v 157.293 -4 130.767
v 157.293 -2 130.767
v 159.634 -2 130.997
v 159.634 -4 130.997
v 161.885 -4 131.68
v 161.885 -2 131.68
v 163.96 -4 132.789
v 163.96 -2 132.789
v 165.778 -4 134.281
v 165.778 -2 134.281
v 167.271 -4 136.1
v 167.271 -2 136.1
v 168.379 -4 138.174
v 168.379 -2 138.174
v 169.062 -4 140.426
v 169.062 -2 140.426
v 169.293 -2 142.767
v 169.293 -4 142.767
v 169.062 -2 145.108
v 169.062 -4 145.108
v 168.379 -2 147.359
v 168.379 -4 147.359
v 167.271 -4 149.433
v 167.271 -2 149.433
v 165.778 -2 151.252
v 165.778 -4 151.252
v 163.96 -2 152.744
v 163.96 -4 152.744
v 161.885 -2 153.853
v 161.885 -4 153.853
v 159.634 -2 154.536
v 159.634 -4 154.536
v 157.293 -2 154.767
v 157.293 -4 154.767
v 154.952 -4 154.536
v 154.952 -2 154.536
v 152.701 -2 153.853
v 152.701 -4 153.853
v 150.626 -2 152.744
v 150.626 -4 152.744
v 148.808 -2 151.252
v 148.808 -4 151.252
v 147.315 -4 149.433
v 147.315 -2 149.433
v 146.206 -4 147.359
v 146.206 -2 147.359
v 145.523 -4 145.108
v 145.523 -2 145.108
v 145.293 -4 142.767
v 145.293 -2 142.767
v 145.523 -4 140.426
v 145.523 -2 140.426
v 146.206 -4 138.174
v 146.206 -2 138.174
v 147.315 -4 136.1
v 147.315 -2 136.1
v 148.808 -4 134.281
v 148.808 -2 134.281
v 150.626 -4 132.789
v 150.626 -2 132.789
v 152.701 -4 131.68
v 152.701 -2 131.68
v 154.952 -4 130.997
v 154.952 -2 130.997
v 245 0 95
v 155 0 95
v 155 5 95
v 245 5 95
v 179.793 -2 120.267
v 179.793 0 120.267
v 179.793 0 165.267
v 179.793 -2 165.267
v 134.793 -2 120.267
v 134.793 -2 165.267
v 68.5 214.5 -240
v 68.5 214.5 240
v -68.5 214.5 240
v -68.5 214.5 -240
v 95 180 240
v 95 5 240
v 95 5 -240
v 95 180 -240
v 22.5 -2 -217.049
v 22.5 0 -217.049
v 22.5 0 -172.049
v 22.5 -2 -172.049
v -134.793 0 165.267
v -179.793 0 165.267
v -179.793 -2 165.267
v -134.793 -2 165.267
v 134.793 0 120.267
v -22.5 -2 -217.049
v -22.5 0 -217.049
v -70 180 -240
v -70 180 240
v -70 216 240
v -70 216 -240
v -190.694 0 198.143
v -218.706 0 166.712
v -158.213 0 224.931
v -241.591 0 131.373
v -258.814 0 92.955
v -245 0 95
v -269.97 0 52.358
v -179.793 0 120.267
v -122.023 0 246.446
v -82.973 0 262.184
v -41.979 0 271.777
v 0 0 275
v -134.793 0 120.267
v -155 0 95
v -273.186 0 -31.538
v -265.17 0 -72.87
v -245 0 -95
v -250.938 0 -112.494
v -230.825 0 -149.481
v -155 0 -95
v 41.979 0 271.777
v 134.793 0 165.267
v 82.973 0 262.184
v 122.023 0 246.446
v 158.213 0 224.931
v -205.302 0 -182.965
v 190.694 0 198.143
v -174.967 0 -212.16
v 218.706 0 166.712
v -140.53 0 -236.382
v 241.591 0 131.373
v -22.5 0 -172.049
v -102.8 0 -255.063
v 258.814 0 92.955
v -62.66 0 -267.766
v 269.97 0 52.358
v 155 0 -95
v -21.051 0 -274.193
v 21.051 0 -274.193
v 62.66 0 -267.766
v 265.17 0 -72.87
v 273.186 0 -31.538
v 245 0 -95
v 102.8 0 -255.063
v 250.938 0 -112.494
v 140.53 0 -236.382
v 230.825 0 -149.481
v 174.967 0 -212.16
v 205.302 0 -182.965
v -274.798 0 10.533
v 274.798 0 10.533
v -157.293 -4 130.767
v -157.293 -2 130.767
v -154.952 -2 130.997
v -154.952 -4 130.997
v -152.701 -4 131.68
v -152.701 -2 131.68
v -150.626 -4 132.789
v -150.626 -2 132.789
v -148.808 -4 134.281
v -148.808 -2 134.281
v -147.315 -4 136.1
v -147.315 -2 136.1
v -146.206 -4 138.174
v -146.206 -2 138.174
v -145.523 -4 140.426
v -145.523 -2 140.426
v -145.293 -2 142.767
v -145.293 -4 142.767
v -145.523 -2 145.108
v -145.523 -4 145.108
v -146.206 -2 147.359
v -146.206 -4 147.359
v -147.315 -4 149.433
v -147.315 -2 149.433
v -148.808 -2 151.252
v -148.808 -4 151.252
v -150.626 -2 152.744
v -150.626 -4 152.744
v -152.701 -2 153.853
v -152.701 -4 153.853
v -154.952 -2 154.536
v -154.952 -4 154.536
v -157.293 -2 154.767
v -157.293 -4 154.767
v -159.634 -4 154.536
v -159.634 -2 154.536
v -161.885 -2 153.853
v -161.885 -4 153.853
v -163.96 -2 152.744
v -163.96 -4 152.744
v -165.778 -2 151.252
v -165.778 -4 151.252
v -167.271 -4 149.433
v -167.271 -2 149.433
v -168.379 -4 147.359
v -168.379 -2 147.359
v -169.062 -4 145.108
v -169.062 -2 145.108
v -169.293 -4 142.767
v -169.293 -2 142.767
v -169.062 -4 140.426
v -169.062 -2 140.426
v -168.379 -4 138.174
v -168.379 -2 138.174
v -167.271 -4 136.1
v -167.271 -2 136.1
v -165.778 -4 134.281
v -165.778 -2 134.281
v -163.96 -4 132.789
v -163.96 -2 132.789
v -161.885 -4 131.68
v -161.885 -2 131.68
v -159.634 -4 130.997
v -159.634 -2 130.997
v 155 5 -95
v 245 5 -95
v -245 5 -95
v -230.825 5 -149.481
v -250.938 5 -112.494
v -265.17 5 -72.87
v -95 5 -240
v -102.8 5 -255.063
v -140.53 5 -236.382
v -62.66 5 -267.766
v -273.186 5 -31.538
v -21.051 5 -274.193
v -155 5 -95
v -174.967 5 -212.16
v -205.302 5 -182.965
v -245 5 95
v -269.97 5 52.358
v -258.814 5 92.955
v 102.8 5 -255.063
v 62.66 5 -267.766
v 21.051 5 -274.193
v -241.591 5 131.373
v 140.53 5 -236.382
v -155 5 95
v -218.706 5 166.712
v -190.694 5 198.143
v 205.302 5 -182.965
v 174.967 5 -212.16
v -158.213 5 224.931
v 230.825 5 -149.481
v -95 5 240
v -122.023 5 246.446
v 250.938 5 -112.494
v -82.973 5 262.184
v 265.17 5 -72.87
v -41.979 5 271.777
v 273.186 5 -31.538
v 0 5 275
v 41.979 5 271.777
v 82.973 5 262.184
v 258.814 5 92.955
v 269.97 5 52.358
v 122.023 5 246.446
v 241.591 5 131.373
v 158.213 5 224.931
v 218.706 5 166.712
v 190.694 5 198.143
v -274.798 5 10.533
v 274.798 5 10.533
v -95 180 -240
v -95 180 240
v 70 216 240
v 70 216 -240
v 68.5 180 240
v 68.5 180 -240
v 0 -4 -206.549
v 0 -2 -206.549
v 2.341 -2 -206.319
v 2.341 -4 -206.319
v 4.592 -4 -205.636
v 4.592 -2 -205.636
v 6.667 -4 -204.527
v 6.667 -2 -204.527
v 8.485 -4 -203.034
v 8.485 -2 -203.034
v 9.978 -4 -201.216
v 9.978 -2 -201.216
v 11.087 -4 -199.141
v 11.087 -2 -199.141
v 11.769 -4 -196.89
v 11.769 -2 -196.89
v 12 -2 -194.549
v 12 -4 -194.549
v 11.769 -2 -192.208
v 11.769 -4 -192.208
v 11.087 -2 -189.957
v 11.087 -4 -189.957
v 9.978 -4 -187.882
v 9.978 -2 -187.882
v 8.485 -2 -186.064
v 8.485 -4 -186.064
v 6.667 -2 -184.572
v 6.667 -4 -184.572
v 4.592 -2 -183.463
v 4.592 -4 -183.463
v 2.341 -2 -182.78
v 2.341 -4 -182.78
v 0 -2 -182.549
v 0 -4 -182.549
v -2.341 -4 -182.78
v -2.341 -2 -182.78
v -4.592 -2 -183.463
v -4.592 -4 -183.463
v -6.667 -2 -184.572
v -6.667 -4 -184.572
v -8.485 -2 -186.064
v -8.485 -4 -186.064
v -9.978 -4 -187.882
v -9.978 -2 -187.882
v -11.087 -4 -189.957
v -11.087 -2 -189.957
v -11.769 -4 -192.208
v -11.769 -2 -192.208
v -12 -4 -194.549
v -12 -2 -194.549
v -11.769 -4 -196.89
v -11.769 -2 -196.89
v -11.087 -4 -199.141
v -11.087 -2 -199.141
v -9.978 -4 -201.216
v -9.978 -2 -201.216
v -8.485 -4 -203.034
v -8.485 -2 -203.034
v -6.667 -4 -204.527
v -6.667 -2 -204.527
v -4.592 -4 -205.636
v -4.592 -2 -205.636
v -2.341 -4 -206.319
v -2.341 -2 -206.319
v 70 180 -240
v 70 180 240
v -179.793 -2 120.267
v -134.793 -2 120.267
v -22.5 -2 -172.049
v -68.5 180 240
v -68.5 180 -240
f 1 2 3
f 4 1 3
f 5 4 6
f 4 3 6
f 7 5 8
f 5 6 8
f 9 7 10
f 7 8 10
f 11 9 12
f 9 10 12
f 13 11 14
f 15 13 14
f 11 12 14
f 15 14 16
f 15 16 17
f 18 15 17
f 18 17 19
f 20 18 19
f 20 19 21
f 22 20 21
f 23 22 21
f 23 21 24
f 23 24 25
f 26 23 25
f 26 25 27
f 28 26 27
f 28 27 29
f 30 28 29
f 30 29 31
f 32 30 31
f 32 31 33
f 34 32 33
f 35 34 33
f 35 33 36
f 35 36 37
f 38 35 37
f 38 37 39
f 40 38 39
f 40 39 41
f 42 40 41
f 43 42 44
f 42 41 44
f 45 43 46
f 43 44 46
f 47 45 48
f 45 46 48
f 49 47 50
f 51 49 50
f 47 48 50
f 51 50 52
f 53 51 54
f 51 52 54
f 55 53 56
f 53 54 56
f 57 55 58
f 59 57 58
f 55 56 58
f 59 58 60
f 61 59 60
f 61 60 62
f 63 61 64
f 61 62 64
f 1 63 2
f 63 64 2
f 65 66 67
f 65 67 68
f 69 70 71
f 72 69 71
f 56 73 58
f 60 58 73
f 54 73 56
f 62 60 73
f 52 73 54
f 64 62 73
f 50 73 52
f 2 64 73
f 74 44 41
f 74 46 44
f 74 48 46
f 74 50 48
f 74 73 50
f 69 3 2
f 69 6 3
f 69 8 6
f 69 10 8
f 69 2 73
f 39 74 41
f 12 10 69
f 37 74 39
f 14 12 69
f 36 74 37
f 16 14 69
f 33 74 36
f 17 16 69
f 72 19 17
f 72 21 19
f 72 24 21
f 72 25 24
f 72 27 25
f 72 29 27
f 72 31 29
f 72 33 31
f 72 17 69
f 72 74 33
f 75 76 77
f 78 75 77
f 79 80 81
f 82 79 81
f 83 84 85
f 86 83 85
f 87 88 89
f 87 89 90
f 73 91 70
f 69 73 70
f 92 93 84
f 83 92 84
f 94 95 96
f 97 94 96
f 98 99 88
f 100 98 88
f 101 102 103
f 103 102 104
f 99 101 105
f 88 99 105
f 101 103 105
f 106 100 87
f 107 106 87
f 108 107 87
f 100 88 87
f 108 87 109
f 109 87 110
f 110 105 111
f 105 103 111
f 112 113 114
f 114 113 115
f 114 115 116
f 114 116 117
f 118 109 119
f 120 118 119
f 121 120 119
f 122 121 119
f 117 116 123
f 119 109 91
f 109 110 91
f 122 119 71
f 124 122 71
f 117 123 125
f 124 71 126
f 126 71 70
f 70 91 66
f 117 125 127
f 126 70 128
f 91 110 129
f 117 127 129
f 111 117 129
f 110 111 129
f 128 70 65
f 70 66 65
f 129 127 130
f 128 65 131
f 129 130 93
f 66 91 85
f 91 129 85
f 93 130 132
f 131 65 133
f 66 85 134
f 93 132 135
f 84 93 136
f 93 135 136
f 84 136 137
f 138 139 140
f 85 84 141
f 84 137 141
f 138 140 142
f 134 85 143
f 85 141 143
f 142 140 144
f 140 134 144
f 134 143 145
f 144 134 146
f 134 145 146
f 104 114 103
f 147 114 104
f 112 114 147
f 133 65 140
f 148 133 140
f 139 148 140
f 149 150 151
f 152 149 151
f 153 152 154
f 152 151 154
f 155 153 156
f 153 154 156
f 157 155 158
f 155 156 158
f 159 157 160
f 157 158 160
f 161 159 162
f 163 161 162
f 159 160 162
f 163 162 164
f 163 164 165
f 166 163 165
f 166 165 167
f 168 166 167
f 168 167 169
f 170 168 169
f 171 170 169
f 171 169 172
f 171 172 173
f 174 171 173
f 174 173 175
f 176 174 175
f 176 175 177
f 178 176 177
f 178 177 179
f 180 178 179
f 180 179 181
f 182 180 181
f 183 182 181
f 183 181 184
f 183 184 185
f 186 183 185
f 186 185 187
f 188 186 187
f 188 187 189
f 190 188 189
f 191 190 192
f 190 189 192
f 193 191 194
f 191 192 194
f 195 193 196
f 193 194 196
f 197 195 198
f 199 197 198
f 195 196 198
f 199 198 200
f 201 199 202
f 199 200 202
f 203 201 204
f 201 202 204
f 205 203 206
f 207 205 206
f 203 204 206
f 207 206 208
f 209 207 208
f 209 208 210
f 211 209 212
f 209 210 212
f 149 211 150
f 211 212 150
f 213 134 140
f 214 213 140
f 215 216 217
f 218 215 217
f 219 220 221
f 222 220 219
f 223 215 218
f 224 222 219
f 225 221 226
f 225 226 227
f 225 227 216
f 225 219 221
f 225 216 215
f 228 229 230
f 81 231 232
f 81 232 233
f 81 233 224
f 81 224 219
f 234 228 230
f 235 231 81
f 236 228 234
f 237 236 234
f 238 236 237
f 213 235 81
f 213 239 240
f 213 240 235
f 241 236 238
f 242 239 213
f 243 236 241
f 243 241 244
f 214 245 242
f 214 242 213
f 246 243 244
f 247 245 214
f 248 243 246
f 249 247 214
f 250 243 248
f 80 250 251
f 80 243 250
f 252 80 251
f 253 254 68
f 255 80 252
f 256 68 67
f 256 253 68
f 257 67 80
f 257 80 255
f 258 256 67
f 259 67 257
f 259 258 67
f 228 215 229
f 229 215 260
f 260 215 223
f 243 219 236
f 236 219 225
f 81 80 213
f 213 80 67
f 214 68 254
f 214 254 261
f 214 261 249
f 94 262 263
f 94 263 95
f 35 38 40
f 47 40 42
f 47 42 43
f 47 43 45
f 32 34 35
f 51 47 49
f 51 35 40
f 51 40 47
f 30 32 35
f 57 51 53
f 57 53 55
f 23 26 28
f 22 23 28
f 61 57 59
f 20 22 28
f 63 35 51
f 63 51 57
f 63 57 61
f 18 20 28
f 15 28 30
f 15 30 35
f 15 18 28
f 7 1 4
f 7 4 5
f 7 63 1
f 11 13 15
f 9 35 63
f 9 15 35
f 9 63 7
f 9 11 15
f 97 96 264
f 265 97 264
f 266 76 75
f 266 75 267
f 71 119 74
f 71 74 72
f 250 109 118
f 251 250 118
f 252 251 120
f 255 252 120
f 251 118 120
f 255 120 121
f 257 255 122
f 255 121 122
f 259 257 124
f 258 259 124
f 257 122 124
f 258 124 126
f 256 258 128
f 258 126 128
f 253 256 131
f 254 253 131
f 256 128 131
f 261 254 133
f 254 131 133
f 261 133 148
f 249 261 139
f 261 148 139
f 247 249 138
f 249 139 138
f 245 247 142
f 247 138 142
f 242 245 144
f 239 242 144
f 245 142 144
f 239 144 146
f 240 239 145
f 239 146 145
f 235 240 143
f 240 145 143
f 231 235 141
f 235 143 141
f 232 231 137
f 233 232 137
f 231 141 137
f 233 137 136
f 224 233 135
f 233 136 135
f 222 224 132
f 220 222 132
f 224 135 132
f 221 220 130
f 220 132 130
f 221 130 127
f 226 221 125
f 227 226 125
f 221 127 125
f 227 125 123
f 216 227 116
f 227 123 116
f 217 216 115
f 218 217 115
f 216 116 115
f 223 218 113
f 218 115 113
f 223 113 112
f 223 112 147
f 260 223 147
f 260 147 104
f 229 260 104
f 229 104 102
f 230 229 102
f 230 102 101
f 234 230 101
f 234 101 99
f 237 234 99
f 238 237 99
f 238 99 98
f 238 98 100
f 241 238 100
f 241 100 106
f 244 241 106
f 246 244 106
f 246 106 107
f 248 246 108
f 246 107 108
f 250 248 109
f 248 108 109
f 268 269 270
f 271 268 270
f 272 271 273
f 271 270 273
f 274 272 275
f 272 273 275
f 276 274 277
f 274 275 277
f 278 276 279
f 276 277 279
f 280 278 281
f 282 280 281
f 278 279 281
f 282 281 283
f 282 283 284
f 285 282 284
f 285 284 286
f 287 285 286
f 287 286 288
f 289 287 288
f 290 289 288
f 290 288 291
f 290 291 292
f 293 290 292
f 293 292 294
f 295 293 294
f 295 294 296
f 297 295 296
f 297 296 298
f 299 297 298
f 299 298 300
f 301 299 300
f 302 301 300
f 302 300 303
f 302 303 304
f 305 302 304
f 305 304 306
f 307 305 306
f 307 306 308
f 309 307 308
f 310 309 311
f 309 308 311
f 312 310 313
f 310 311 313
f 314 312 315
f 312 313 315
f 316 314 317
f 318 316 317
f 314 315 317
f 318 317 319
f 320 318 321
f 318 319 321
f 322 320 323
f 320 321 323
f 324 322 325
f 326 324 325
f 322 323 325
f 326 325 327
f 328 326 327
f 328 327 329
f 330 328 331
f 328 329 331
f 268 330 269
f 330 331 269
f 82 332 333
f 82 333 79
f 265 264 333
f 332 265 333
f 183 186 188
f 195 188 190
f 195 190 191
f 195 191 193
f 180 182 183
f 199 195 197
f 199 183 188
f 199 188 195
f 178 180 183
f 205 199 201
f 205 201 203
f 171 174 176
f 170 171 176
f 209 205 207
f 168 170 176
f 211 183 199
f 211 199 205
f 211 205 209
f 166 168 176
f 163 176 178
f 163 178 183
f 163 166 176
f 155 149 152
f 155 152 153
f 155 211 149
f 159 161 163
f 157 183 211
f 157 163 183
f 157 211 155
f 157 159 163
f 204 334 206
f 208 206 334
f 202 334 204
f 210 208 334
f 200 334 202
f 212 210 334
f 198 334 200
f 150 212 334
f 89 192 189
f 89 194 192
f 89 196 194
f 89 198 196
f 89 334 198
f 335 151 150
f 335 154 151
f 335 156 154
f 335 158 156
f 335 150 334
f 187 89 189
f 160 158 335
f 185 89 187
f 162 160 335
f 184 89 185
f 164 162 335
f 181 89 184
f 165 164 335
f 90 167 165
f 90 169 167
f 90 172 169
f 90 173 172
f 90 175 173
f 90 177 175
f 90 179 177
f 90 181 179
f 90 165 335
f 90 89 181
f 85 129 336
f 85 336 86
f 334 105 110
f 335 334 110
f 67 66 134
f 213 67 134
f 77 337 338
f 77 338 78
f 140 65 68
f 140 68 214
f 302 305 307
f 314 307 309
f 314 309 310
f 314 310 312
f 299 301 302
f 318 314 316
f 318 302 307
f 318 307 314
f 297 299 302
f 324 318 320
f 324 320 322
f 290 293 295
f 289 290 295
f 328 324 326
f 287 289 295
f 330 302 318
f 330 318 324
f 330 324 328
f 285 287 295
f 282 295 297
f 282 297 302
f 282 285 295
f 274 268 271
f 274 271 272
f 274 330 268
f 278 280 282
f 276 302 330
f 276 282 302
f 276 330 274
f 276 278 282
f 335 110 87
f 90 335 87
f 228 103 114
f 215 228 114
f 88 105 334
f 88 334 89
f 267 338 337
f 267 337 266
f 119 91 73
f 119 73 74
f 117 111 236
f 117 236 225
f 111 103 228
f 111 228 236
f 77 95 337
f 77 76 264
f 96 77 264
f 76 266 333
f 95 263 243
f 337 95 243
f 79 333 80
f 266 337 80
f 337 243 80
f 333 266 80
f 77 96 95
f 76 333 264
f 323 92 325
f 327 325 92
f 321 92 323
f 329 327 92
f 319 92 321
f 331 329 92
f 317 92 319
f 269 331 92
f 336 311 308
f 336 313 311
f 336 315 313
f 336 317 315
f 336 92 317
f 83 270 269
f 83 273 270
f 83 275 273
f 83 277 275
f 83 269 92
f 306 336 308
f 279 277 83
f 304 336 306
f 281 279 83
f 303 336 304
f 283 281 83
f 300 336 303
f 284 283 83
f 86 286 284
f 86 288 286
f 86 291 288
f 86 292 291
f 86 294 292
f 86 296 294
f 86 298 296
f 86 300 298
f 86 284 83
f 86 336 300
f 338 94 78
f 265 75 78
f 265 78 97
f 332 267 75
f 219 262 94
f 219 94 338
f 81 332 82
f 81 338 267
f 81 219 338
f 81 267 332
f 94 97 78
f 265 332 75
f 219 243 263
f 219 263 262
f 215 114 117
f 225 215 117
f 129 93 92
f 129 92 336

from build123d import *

# Parameters (mm, degrees)
SKETCH_1_R      = 275
SKETCH_1_W      = 90
SKETCH_1_H      = 190
EXTRUDE_1_DEPTH = 5
SKETCH_1_4_W    = 190
SKETCH_1_4_H    = 480
EXTRUDE_2_DEPTH = 180
EXTRUDE_3_DEPTH = 480
SKETCH_5_W      = 45
SKETCH_5_H      = 45
SKETCH_5_R      = 12
EXTRUDE_4_DEPTH = 2
SKETCH_5_3_R    = 12
EXTRUDE_5_DEPTH = 4


with BuildPart() as part:
    # 草图1 → 凸台-拉伸1 (new body)
    with BuildSketch(Plane(origin=(0, 0, 0), x_dir=(1, 0, 0), z_dir=(0, 1, 0))):
        with Locations(Location((0, 0, 0), (0, 0, 270))):
            Circle(SKETCH_1_R)
        with Locations((-200, 0)):
            Rectangle(SKETCH_1_W, SKETCH_1_H, mode=Mode.SUBTRACT)
        with Locations((200, 0)):
            Rectangle(SKETCH_1_W, SKETCH_1_H, mode=Mode.SUBTRACT)
    extrude(amount=EXTRUDE_1_DEPTH)

    # 草图1<4> → 凸台-拉伸2 (add)
    with BuildSketch(Plane(origin=(0, 0, 0), x_dir=(1, 0, 0), z_dir=(0, 1, 0))):
        Rectangle(SKETCH_1_4_W, SKETCH_1_4_H)
    extrude(amount=EXTRUDE_2_DEPTH)

    # 草图2 → 凸台-拉伸3 (add)
    with BuildSketch(Plane.XY.offset(240)):
        Polygon((-68.5, 214.5), (-68.5, 181.5), (-68.5, 180), (-70, 180), (-70, 216), (70, 216), (70, 180), (68.5, 180), (68.5, 181.5), (68.5, 214.5), align=None)
    extrude(amount=-EXTRUDE_3_DEPTH)

    # 草图5 → 凸台-拉伸4 (add)
    # profile 1 of 3: a face of its own
    with BuildSketch(Plane.XZ):
        with Locations((-157.292912236, 142.766592664)):
            Rectangle(SKETCH_5_W, SKETCH_5_H)
        with Locations(Location((-157.292912236, 142.766592664, 0), (0, 0, 270))):
            Circle(SKETCH_5_R, mode=Mode.SUBTRACT)
    # profile 2 of 3: a face of its own
    with BuildSketch(Plane.XZ):
        with Locations((157.292912236, 142.766592664)):
            Rectangle(SKETCH_5_W, SKETCH_5_H)
        with Locations(Location((157.292912236, 142.766592664, 0), (0, 0, 270))):
            Circle(SKETCH_5_R, mode=Mode.SUBTRACT)
    # profile 3 of 3: a face of its own
    with BuildSketch(Plane.XZ):
        with Locations((0, -194.549146173)):
            Rectangle(SKETCH_5_W, SKETCH_5_H)
        with Locations(Location((0, -194.549146173, 0), (0, 0, 270))):
            Circle(SKETCH_5_R, mode=Mode.SUBTRACT)
    extrude(amount=EXTRUDE_4_DEPTH)

    # 草图5<3> → 凸台-拉伸5 (add)
    with BuildSketch(Plane.XZ):
        with Locations(Location((-157.292912236, 142.766592664, 0), (0, 0, 270))):
            Circle(SKETCH_5_3_R)
        with Locations(Location((0, -194.549146173, 0), (0, 0, 270))):
            Circle(SKETCH_5_3_R)
        with Locations(Location((157.292912236, 142.766592664, 0), (0, 0, 270))):
            Circle(SKETCH_5_3_R)
    extrude(amount=EXTRUDE_5_DEPTH)


solid = part.part
